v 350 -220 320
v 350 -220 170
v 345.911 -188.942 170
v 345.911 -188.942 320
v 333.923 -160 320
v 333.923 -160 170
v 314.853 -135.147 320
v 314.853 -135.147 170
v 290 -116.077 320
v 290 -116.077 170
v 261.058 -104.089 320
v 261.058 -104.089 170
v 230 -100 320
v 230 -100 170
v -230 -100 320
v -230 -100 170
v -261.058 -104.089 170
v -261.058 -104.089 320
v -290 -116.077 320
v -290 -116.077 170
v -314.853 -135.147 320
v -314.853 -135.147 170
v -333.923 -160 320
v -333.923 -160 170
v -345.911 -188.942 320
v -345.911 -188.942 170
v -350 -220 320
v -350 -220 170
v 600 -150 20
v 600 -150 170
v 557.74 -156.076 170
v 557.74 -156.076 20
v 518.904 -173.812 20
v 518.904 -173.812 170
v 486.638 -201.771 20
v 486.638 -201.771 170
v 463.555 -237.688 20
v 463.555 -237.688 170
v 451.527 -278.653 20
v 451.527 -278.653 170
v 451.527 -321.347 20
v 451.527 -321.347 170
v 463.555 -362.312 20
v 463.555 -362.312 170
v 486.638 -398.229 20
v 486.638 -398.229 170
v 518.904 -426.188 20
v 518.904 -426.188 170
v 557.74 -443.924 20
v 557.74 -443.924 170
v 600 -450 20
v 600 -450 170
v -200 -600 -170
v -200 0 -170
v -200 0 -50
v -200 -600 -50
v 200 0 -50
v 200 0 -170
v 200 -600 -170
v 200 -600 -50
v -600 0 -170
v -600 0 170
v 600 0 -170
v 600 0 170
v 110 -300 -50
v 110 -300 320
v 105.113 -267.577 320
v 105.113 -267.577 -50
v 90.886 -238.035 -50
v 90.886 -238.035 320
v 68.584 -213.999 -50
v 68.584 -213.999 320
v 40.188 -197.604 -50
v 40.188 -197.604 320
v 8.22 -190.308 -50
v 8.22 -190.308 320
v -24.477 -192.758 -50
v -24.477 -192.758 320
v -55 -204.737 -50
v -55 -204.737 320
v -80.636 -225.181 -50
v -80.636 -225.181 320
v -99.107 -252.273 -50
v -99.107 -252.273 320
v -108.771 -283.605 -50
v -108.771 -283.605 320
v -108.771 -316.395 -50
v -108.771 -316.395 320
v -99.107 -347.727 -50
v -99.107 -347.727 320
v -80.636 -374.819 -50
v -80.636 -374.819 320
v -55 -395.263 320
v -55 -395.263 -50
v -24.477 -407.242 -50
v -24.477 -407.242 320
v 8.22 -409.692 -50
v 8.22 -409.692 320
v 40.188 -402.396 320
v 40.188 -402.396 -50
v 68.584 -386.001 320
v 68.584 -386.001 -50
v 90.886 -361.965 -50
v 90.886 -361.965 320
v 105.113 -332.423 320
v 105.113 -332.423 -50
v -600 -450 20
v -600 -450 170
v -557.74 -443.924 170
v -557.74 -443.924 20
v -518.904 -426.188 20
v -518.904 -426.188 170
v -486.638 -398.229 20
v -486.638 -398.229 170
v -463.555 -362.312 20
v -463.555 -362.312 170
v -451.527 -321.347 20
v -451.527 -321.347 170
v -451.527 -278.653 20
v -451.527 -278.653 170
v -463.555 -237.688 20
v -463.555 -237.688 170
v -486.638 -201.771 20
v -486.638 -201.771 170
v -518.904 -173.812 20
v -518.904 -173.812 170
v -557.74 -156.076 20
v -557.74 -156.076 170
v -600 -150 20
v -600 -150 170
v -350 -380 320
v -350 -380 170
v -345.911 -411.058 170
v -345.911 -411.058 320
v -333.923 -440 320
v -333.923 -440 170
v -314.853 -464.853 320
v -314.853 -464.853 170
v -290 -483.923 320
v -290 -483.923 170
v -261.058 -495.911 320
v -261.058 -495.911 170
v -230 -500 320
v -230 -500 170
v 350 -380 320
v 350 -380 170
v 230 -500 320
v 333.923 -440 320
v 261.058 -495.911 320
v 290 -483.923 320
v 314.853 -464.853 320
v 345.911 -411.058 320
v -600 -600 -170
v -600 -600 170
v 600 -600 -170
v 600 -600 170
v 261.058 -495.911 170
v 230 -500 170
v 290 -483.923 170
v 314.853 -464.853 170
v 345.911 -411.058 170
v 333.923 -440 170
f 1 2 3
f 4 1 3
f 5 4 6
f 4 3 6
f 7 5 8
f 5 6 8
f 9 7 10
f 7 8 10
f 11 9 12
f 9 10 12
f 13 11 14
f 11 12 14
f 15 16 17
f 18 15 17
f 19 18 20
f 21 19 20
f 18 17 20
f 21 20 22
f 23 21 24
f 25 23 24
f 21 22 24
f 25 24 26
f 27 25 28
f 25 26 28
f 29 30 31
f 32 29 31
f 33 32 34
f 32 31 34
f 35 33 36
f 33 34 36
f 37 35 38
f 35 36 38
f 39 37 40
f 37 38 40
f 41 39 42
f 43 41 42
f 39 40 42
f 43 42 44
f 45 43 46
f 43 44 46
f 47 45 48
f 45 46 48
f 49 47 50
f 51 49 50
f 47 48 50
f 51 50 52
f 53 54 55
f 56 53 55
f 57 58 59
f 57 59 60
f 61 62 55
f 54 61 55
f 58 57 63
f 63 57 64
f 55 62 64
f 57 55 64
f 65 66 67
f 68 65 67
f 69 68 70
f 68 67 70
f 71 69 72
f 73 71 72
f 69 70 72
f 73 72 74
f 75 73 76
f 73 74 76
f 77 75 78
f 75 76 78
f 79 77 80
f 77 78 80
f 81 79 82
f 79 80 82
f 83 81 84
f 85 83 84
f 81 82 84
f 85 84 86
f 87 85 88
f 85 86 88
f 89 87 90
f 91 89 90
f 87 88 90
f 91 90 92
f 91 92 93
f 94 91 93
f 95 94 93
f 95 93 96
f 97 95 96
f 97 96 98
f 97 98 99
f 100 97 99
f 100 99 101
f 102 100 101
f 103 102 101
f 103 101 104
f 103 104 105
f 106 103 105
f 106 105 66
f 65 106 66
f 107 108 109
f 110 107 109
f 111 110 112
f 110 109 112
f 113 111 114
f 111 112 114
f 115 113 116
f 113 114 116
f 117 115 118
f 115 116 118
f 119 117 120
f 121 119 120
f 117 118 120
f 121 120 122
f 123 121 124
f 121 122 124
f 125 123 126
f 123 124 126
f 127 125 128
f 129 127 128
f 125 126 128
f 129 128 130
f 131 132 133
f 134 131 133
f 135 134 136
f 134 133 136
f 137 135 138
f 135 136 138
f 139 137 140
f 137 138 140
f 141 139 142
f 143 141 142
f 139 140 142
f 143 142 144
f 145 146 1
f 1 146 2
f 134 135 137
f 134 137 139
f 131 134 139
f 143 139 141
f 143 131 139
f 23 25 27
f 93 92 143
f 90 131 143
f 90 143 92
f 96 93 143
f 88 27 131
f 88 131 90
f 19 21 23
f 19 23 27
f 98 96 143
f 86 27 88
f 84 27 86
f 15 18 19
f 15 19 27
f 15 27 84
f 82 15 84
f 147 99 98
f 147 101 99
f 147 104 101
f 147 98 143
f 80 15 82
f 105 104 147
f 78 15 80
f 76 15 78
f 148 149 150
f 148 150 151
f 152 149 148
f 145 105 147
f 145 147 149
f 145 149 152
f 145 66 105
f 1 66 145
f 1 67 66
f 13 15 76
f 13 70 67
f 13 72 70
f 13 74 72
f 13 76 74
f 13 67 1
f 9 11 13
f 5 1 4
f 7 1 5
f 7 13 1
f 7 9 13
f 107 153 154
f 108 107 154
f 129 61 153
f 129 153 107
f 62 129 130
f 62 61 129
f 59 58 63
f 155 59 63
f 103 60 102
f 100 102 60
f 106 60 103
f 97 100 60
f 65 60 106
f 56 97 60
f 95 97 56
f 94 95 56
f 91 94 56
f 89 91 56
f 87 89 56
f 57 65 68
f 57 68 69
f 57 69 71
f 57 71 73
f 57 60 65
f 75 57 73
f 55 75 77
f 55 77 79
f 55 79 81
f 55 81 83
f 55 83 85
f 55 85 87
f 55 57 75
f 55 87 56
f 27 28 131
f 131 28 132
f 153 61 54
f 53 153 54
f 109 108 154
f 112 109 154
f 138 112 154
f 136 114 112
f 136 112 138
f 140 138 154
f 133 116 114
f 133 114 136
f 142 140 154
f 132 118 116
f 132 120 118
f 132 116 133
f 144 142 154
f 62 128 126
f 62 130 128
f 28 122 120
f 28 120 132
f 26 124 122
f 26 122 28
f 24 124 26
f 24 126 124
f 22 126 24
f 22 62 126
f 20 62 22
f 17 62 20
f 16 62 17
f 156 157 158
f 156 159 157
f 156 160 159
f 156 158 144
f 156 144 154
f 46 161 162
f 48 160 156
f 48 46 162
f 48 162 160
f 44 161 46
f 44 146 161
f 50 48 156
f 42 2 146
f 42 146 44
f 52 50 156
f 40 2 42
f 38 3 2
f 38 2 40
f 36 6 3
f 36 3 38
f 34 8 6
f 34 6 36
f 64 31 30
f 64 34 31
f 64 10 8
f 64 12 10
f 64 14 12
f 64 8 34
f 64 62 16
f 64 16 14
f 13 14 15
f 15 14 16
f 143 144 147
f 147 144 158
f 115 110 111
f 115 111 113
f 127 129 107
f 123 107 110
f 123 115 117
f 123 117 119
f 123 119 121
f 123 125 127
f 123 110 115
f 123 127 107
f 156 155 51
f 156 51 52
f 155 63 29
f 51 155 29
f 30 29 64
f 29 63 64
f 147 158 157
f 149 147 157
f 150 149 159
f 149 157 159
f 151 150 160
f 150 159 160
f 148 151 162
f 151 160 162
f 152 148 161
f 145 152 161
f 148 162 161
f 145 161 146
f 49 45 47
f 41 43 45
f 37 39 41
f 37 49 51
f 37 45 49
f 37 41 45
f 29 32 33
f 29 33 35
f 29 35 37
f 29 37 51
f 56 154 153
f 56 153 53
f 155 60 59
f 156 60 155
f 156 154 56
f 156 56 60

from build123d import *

# Parameters (mm, degrees)
F0_W     = 1200
F0_H     = 340
F1_DEPTH = 600
F3_DEPTH = 150
F4_W     = 400
F4_H     = 120
F5_DEPTH = 600.001
F7_DEPTH = 150
F8_R     = 110
F9_DEPTH = 490.001


# Not quite as in the source:
# - a feature names something its author has since deleted; it is built from what else it names


with BuildPart() as f1:
    # F0 (on Front) → F1 (new body)
    with BuildSketch(Plane.XZ):
        Rectangle(F0_W, F0_H)
    extrude(amount=F1_DEPTH)

    # F2 (on face) → F3 (cut)
    with BuildSketch(Plane.XY.offset(170)):
        with BuildLine():
            Line((-600, -150), (-600, -450))
            ThreePointArc((-600, -450), (-450, -300), (-600, -150))
        make_face()
        with BuildLine():
            ThreePointArc((600, -150), (450, -300), (600, -450))
            Line((600, -450), (600, -150))
        make_face()
    extrude(amount=-F3_DEPTH, mode=Mode.SUBTRACT)

    # F4 (on face) → F5 (cut, through all)
    with BuildSketch(Plane(origin=(0, 0, 0), x_dir=(-1, 0, 0), z_dir=(0, 1, 0))):
        with Locations((0, -110)):
            Rectangle(F4_W, F4_H)
    extrude(amount=-F5_DEPTH, mode=Mode.SUBTRACT)

    # F6 (on face) → F7 (join)
    with BuildSketch(Plane.XY.offset(170)):
        with BuildLine():
            Line((230, -100), (-230, -100))
            ThreePointArc((-230, -100), (-314.8528137424, -135.1471862576), (-350, -220))
            Line((-350, -220), (-350, -380))
            ThreePointArc((-350, -380), (-314.8528137424, -464.8528137424), (-230, -500))
            Line((-230, -500), (230, -500))
            ThreePointArc((230, -500), (314.8528137424, -464.8528137424), (350, -380))
            Line((350, -380), (350, -220))
            ThreePointArc((350, -220), (314.8528137424, -135.1471862576), (230, -100))
        make_face()
    extrude(amount=F7_DEPTH)

    # F8 (on face) → F9 (cut, through all)
    with BuildSketch(Plane.XY.offset(320)):
        with Locations((0, -300)):
            Circle(F8_R)
    extrude(amount=-F9_DEPTH, mode=Mode.SUBTRACT)


solid = f1.part
